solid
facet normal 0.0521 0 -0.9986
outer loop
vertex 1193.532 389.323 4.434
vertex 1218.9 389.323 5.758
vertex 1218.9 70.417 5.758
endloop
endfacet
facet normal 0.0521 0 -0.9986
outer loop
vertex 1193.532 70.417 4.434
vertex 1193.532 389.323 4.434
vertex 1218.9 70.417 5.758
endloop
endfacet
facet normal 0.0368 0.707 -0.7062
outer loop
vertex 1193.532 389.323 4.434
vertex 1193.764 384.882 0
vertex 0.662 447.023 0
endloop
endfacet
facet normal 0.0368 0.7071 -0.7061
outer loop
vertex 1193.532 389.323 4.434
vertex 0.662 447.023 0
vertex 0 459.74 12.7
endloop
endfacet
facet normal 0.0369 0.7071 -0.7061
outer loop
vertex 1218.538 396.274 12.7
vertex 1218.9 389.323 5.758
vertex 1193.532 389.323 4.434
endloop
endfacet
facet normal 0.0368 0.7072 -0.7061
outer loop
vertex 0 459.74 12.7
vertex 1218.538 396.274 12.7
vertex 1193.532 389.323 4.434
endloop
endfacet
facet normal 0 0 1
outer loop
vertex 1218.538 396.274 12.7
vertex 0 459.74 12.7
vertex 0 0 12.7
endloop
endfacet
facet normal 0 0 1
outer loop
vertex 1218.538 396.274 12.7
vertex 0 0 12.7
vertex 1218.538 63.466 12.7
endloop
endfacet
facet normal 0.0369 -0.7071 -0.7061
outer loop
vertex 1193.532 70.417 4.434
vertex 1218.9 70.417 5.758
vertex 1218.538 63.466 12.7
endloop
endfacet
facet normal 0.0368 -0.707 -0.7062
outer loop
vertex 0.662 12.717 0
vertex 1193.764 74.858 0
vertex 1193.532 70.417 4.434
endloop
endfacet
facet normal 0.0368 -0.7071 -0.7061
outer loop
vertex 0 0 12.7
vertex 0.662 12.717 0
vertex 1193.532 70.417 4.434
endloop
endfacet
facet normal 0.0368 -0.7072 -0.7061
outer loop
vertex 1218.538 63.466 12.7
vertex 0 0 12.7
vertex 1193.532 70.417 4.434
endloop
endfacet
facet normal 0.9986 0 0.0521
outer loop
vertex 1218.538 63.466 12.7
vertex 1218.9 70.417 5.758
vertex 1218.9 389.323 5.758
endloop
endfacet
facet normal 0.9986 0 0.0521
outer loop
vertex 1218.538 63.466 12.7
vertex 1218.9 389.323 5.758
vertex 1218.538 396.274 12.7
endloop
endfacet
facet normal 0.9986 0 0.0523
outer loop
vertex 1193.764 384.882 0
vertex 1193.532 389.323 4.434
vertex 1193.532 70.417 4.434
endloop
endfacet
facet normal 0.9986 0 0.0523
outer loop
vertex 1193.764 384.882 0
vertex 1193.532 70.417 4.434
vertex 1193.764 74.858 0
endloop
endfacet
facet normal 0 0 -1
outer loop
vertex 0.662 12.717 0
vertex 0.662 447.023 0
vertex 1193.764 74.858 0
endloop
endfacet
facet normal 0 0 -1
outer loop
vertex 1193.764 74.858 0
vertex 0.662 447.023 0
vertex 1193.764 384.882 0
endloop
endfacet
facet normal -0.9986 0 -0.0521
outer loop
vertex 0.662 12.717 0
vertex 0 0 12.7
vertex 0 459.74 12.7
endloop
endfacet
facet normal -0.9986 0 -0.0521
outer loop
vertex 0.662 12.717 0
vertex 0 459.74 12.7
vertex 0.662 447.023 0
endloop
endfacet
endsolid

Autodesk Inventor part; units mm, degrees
ref_plane "YZ Plane" through (0, 0, 0) normal (1, 0, 0) x (0, 1, 0)
ref_plane "XY Plane" through (0, 0, 0) normal (0, 0, 1) x (1, 0, 0)
sketch "Sketch1" plane through (0, 0, 0) normal (0, 0, 1) x (1, 0, 0)
  line L0 (0, 0) -> (1219.2, 0)
  line L1 (1219.2, 0) -> (1219.2, 459.74)
  line L2 (1219.2, 459.74) -> (0, 459.74)
  line L3 (0, 459.74) -> (0, 0)
  line L4 (1219.2, 396.24) -> (1244.6, 396.24) construction
  line L5 (1244.6, 396.24) -> (1244.6, 63.5) construction
  line L6 (1244.6, 63.5) -> (1219.2, 63.5) construction
  line L7 (1219.2, 396.24) -> (0, 459.74)
  line L8 (1219.2, 63.5) -> (0, 0)
  dimension "d0" = 1219.2
  dimension "d1" = 459.74
  dimension "d2" = 25.4
  dimension "d3" = 332.74
  dimension "d4" = 63.5
extrude "Extrusion1" add sketch "Sketch1" along normal blind 12.7 contours L3 L7 L1 L8
sketch "Sketch2" plane through (1219.2, 63.5, 0) normal (1, 0, 0) x (0, 0, -1)
  line L0 (-12.7, 332.74) -> (-12.7, 396.24) projected
  line L1 (-12.7, 332.74) -> (0, 320.0577)
  line L2 (0, 0) -> (0, 332.74) projected
  line L3 (-12.7, 332.74) -> (5.248, 332.74) construction
  line L4 (0, 320.0577) -> (0, 332.74)
  line L5 (0, 332.74) -> (-12.7, 332.74)
  point P0 (0, -63.5)
  dimension "d7" = 44.96
sketch "Sketch3" plane through (0, 0, 0) normal (-1, 0, 0) x (0, 0, 1)
  line L0 (12.7, 396.24) -> (12.7, 459.74) projected
  line L1 (12.7, 459.74) -> (0, 447.0577)
  line L2 (0, 396.24) -> (0, 459.74) projected
  line L3 (12.7, 459.74) -> (30.648, 459.74) construction
  line L4 (0, 459.74) -> (12.7, 459.74) projected
  line L5 (0, 447.0577) -> (0, 459.74)
  line L6 (0, 459.74) -> (12.7, 459.74)
  point P0 (0, 0)
  dimension "d8" = 135.04
loft "Loft1" cut profiles "Sketch3", "Sketch2"
sketch "Sketch4" plane through (0, 0, 0) normal (-1, 0, 0) x (0, 0, 1)
  line L0 (12.7, 0) -> (12.7, 63.5) projected
  line L1 (12.7, 0) -> (0, 12.6823)
  line L2 (0, 0) -> (0, 63.5) projected
  line L3 (12.7, 0) -> (30.648, 0) construction
  line L4 (0, 12.6823) -> (0, 0)
  line L5 (12.7, 0) -> (0, 0)
  dimension "d13" = 135.04
sketch "Sketch5" plane through (1219.2, 63.5, 12.7) normal (1, 0, 0) x (0, 0, -1)
  line L0 (12.7, 0) -> (0, 0) projected
  line L1 (0, 0) -> (12.7, 12.6823)
  line L2 (12.7, 383.5577) -> (12.7, -63.5) projected
  line L3 (0, 0) -> (17.948, 0) construction
  line L4 (12.7, 12.6823) -> (12.7, 0)
  line L5 (12.7, -63.5) -> (12.7, 0) projected
  line L6 (12.7, 0) -> (0, 0)
  dimension "d14" = 44.96
loft "Loft2" cut profiles "Sketch5", "Sketch4"
ref_plane "Center Plane" through (0, 228.6, 0) normal (0, 1, 0) x (-1, 0, 0)
sketch "Sketch6" plane through (0, 228.6, 0) normal (0, 1, 0) x (-1, 0, 0)
  line L0 (-1219.2, 12.7) -> (-1219.2, 0) projected
  line L1 (-1219.2, 0) -> (0, 0) projected
  line L2 (-1219.2, 12.7) -> (-1206.4827, 12.7) construction
  line L3 (-1219.2, 0) -> (-1218.5378, 12.7)
  line L4 (-1219.2, 0) -> (-1206.4827, 0) construction
  line L5 (0, 12.7) -> (-1219.2, 12.7) projected
  dimension "d26" = 87.015
extrude "Extrusion2" cut sketch "Sketch6" against normal through all both and the other way through all
sketch "Sketch8" plane through (1218.5378, 63.4655, 12.7) normal (0.9986, 0, 0.0521) x (0.0521, 0, -0.9986)
  line L0 (12.7173, 12.7168) -> (0, 0) projected
  line L1 (12.7173, 12.7168) -> (12.7173, 320.0922) projected
  line L2 (0, 332.809) -> (12.7173, 320.0922) projected
  line L3 (0, 0) -> (0, 332.809) projected
  line L4 (12.7173, 12.7168) -> (12.7173, 320.0922) projected
  line L5 (12.7173, 345.4922) -> (6.9515, 345.4922)
  line L6 (6.9515, 345.4922) -> (6.9515, -12.6832)
  line L7 (6.9515, -12.6832) -> (12.7173, -12.6832)
  line L8 (12.7173, -12.6832) -> (12.7173, 345.4922)
  point P0 (-50.772, -63.4655)
  dimension "d27" = 5.7658
  dimension "d28" = 25.4
  dimension "d29" = 25.4
extrude "Extrusion3" cut sketch "Sketch8" against normal blind 25.4 contours L8 L7 L6 L0 | L0 L6 L2 L1 | L2 L6 L5 L8
sketch "Sketch9" plane through (0, 228.6, 0) normal (0, 1, 0) x (-1, 0, 0)
  line L0 (-1193.5342, 4.4353) -> (-1193.7655, 0) projected
  line L1 (0, 0) -> (-1193.7655, 0) projected
  line L2 (0, 12.7) -> (0, 0) projected
  line L3 (-1218.5378, 12.7) -> (0, 12.7) projected
  line L4 (-1218.5378, 12.7) -> (-1218.8997, 5.758) projected
  line L5 (-1218.8997, 5.758) -> (-1193.5342, 4.4353) projected
  line L6 (0, 12.7) -> (-0.6622, 0)
  line L7 (0, 12.7) -> (12.7173, 12.7) construction
  point P0 (0, 0)
  dimension "d32" = 92.985
extrude "Extrusion4" cut sketch "Sketch9" against normal through all both and the other way through all contours L6 L2 L1
properties part number "Wind Tunnel Output Body Single Panel" material "Wood (Oak)"
